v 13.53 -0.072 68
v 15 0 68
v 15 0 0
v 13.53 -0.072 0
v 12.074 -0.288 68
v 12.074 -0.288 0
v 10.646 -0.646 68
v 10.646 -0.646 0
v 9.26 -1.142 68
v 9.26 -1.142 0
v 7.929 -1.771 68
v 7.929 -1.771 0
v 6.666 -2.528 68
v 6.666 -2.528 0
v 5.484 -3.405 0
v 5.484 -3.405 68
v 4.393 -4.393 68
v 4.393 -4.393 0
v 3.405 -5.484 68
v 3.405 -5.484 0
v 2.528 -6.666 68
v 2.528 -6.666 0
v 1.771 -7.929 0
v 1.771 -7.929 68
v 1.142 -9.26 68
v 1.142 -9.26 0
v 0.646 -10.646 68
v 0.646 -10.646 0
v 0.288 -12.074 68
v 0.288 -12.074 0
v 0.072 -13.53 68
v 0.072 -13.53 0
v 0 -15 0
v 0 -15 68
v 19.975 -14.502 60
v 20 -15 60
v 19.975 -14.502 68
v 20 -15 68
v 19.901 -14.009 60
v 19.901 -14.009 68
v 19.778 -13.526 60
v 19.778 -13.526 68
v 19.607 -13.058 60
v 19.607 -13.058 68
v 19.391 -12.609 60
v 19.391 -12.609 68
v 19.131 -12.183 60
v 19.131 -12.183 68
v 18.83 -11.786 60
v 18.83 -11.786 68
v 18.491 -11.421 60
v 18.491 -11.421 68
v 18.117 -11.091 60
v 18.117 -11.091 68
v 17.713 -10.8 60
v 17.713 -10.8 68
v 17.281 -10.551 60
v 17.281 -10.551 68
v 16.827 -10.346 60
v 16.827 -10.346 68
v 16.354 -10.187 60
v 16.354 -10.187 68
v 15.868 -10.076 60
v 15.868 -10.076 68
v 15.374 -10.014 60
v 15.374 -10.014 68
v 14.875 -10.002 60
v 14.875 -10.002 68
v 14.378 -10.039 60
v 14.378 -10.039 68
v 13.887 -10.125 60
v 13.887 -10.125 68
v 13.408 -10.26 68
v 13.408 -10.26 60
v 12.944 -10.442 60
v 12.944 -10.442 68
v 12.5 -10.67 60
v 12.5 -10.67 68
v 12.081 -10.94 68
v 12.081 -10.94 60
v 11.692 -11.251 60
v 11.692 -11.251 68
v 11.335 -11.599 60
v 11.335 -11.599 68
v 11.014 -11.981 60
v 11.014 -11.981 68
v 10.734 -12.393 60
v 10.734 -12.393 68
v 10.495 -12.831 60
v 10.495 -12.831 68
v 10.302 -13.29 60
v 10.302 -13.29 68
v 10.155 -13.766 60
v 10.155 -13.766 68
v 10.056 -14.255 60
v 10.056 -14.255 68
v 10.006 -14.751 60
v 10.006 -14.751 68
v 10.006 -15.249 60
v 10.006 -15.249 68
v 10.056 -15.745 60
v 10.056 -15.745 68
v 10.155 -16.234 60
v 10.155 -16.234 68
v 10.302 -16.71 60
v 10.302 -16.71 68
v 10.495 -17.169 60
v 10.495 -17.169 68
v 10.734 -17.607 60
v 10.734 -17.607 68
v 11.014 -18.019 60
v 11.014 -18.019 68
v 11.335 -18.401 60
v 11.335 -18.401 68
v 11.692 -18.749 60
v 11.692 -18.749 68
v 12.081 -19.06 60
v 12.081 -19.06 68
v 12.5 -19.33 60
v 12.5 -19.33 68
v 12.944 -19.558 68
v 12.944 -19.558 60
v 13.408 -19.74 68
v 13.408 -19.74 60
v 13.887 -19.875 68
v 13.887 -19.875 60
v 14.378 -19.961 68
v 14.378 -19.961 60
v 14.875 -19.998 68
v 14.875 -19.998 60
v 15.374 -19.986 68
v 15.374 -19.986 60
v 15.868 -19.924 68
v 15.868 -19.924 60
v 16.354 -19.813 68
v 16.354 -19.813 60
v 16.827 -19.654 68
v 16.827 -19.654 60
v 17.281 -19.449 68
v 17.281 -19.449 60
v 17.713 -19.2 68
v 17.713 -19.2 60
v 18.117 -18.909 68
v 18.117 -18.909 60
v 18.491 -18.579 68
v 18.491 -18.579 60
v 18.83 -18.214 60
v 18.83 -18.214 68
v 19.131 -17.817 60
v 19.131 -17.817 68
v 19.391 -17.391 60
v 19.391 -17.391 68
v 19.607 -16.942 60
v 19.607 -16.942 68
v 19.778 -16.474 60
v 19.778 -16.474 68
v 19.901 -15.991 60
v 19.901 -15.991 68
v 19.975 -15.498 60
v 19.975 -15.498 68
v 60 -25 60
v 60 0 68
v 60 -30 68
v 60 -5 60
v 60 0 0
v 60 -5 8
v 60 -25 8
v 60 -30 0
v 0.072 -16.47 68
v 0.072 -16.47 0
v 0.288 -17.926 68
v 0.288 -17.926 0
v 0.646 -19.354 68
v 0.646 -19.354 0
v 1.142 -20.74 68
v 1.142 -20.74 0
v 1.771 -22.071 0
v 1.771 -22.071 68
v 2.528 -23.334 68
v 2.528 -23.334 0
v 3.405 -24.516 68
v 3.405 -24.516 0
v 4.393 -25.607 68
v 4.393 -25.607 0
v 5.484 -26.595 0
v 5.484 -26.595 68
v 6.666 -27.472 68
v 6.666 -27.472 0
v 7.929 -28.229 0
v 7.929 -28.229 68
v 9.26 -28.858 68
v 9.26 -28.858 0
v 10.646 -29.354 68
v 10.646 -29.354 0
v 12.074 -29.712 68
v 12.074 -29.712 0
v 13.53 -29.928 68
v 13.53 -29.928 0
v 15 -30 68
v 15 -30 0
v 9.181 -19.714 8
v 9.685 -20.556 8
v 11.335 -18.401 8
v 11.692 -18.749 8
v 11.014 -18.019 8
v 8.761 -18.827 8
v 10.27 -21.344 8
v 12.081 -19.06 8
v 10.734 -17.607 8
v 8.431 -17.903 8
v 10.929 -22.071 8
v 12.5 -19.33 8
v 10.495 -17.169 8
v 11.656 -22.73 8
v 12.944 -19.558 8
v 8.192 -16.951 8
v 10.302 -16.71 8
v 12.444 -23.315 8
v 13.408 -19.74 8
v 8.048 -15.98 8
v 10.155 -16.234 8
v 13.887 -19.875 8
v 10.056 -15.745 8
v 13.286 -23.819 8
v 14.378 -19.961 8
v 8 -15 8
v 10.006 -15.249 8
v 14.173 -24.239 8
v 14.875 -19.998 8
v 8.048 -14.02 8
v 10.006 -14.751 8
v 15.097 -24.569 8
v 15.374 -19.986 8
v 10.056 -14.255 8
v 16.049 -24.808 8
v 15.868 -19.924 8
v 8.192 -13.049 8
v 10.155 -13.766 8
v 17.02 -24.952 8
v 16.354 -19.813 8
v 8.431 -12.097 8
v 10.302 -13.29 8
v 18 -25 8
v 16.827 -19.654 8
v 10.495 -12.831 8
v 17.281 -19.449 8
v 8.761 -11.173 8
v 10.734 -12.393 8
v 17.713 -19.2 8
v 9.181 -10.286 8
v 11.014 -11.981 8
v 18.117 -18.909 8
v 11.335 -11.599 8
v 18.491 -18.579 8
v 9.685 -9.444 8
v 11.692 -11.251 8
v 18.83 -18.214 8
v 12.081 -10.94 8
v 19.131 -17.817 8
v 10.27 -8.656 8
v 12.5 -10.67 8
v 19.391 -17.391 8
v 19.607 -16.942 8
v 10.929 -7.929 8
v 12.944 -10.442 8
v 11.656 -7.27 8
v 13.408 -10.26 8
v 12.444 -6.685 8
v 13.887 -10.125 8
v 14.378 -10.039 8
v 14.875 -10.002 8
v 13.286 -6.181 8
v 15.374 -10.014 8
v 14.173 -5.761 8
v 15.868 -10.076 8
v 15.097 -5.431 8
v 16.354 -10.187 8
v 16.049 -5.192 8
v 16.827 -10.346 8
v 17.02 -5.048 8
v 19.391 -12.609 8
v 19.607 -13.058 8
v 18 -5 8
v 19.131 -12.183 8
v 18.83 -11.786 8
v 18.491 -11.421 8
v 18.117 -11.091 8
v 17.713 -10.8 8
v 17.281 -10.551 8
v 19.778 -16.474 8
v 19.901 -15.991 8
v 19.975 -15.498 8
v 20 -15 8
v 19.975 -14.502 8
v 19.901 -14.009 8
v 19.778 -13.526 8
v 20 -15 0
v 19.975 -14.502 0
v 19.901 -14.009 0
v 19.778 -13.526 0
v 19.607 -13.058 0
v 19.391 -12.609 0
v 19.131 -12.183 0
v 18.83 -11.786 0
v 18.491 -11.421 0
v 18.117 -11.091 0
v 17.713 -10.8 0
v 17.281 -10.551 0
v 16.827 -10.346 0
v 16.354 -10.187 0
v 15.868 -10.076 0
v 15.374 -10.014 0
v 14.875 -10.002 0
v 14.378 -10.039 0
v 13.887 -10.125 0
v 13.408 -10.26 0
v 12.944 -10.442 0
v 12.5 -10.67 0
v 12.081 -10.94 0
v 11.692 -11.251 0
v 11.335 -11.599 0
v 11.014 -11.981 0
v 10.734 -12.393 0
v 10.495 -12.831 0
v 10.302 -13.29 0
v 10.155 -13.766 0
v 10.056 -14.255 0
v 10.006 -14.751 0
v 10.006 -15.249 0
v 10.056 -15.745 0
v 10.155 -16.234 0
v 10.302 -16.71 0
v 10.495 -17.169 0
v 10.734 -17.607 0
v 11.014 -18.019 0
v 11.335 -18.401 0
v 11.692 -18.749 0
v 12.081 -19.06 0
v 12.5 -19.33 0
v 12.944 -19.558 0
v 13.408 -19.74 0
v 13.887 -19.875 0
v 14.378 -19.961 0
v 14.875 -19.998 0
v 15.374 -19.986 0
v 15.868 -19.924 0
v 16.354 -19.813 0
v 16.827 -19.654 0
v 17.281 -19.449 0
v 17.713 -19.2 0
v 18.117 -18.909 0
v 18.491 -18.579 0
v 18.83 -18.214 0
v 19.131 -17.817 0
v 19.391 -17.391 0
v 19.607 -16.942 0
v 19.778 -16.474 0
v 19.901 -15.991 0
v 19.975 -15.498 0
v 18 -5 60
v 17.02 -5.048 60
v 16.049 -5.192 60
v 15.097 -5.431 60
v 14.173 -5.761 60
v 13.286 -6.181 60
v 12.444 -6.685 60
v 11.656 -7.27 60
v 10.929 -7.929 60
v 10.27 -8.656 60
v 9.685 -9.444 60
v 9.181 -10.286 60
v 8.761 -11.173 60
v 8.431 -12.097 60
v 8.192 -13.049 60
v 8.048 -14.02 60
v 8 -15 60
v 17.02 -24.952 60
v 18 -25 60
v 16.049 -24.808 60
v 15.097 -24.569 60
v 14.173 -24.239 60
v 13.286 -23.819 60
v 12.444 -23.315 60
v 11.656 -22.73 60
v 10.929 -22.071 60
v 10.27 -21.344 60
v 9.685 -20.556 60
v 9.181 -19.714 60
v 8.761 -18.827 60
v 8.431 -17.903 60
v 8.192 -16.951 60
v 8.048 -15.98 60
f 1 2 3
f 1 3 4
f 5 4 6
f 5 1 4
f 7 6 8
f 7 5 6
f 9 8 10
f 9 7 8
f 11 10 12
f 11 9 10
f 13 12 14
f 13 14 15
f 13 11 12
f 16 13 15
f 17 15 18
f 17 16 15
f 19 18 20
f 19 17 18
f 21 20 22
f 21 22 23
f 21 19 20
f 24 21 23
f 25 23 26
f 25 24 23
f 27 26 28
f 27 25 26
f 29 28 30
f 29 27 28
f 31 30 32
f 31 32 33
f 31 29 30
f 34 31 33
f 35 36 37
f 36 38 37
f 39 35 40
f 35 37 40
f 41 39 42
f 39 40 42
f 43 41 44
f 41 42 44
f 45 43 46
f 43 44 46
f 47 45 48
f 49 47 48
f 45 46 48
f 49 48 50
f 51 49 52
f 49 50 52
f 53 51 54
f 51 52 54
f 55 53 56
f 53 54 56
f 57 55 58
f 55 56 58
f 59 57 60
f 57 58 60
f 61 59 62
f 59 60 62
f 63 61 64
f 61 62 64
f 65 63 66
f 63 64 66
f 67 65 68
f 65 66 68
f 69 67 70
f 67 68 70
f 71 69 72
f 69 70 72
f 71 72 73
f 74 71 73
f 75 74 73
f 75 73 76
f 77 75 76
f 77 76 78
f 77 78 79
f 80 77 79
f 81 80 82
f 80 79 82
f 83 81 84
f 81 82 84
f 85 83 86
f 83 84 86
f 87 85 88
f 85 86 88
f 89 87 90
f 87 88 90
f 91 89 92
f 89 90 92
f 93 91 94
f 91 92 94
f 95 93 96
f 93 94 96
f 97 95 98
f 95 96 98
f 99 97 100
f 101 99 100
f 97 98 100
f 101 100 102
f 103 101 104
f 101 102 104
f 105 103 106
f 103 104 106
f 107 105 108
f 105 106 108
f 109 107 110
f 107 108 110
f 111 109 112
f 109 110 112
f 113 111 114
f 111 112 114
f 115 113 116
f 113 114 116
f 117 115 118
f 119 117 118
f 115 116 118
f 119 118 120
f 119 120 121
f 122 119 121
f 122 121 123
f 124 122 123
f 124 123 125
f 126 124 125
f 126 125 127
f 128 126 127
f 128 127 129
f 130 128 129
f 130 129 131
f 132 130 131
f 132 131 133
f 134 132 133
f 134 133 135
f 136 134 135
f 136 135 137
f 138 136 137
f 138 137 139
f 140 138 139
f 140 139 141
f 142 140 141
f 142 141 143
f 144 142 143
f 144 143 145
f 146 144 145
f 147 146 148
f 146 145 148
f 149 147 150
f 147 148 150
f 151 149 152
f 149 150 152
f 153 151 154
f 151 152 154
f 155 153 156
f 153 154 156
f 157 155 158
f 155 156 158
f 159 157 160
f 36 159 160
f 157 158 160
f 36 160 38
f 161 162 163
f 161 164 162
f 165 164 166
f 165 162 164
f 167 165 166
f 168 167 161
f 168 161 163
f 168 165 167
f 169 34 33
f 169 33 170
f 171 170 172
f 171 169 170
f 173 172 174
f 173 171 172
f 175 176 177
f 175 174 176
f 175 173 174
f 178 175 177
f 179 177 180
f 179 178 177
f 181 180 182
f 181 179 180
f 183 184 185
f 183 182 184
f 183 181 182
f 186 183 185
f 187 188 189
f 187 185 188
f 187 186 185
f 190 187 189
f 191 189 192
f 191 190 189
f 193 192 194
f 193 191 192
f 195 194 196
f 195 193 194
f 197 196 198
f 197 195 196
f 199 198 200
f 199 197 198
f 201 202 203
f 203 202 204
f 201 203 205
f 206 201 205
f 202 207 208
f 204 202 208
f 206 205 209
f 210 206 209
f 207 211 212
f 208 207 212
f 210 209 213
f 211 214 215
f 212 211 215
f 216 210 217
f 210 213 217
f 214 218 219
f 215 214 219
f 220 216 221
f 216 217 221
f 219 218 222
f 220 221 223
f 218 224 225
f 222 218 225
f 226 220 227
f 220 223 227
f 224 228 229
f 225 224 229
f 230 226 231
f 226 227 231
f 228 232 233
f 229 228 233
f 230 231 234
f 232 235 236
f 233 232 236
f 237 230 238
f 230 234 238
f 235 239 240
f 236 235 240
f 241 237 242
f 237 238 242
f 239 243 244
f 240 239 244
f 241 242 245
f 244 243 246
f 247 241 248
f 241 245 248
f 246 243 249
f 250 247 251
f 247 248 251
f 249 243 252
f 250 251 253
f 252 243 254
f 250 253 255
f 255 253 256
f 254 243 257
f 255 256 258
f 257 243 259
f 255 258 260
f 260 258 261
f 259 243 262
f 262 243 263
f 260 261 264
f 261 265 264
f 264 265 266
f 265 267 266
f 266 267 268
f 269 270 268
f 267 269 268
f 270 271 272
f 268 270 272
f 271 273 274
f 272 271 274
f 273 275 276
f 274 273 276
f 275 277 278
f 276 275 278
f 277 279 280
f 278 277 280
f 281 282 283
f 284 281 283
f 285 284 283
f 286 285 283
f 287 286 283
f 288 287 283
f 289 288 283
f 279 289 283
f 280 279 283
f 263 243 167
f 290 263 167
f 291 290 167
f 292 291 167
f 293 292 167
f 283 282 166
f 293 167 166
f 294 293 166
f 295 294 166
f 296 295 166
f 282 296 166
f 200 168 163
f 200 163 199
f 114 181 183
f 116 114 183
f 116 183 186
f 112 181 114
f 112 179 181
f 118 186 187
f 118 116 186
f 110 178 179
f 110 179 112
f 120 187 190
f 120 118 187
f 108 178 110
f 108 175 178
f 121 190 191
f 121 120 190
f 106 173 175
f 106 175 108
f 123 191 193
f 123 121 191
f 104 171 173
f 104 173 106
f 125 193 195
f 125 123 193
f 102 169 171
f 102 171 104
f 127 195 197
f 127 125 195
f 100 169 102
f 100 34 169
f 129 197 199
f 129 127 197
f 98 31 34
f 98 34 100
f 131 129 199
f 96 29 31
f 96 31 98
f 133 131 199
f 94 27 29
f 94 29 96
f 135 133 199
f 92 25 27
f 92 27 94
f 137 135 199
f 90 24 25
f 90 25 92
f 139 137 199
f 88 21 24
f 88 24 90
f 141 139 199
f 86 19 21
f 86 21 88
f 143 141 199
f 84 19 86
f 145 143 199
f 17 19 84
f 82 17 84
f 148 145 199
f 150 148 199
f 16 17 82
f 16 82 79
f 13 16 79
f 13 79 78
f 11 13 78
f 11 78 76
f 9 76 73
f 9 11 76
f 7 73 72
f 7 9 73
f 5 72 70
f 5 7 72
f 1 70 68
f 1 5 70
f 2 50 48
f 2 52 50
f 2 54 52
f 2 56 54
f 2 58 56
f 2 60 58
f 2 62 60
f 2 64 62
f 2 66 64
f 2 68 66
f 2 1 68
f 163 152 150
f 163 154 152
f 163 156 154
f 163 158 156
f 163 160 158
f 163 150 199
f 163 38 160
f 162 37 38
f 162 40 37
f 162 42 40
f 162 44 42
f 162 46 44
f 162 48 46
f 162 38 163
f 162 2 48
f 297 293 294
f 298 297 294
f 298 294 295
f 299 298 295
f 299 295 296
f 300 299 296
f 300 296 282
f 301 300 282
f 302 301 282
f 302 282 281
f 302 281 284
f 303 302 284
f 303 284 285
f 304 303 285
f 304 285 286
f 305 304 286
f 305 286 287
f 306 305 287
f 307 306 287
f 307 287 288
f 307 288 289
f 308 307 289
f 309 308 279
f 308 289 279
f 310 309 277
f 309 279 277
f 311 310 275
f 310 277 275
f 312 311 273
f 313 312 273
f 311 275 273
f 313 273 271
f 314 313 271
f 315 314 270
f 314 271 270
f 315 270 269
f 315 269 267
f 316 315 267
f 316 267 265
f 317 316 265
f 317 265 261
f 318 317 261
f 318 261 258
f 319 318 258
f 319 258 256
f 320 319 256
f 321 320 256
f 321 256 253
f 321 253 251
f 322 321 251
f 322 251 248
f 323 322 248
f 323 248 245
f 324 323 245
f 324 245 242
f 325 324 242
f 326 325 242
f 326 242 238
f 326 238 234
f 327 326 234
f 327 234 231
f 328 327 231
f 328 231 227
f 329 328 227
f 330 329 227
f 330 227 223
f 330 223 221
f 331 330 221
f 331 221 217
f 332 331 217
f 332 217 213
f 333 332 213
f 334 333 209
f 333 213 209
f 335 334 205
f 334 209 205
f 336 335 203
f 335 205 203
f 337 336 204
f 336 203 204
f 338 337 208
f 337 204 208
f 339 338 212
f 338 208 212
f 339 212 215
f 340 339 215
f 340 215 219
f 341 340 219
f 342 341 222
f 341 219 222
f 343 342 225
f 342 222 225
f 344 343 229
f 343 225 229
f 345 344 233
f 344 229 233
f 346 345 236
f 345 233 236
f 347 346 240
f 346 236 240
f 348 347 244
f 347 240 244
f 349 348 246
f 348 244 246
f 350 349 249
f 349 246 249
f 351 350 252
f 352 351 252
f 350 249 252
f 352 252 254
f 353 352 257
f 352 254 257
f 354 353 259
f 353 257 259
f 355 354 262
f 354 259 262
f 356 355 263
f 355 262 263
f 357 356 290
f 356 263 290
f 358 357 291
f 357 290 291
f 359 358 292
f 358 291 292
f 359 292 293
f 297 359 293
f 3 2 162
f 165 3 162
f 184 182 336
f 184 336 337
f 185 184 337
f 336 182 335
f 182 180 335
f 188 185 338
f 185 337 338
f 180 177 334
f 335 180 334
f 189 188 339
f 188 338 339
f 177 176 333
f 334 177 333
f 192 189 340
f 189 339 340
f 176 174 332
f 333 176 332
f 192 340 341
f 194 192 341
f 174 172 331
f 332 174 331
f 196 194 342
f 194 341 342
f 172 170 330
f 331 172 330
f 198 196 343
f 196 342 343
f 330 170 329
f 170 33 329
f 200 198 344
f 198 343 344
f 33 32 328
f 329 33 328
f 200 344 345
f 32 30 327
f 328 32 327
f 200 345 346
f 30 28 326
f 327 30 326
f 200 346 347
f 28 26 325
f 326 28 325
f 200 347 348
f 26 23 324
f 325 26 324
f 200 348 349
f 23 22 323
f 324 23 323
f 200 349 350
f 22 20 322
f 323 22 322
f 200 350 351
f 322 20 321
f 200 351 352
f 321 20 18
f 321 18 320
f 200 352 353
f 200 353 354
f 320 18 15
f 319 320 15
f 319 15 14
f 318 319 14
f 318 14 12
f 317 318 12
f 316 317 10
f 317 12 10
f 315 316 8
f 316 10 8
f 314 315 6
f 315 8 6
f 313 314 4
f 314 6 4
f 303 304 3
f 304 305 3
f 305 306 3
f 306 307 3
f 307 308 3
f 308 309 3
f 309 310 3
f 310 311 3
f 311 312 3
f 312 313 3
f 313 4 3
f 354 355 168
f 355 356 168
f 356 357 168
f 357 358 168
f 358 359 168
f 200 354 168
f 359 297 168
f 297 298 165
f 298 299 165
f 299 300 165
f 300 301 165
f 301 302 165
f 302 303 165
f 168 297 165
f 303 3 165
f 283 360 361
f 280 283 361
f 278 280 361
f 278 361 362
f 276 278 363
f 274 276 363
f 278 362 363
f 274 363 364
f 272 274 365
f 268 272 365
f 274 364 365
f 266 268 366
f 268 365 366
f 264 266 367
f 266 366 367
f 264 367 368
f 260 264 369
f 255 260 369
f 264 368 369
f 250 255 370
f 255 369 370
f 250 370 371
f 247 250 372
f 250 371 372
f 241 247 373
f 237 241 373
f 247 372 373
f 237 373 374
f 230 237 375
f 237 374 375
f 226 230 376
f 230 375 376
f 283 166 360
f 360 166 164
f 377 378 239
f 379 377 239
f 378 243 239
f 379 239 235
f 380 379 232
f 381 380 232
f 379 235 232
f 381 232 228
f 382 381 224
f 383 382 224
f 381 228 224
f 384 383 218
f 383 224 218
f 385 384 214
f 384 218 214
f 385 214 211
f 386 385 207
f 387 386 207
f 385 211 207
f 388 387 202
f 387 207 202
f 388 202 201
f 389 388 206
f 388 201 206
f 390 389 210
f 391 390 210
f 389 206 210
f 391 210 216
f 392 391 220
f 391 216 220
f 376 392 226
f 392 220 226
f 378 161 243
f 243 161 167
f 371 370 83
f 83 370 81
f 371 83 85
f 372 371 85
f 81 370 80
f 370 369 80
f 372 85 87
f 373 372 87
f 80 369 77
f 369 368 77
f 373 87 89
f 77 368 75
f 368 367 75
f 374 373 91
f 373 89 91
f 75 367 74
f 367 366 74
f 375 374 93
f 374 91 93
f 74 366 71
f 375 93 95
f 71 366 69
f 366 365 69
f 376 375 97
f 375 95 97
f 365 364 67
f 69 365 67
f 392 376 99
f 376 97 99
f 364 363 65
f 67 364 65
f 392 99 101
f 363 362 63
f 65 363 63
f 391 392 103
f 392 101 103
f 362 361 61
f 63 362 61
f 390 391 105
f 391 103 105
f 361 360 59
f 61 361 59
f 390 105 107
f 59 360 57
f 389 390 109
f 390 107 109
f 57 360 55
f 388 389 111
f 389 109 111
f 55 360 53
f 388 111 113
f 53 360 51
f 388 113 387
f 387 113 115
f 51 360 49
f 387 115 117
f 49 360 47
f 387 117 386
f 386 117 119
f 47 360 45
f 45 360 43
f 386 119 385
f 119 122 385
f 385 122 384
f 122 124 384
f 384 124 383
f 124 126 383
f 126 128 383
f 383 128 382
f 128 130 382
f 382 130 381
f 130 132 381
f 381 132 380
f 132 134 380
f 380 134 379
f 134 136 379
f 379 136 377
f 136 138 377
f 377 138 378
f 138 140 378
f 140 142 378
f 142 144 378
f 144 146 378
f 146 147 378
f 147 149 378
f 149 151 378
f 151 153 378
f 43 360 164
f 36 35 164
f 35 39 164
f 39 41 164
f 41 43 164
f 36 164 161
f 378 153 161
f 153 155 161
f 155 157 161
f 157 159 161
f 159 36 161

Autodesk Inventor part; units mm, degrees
ref_plane "YZ Plane" through (0, 0, 0) normal (1, 0, 0) x (0, 1, 0)
ref_plane "XZ Plane" through (0, 0, 0) normal (0, 1, 0) x (-1, 0, 0)
ref_plane "XY Plane" through (0, 0, 0) normal (0, 0, 1) x (1, 0, 0)
sketch "Sketch1" plane through (0, 0, 0) normal (0, 0, 1) x (1, 0, 0)
  line L0 (0, 0) -> (60, 0)
  line L1 (60, 0) -> (60, -30)
  line L2 (60, -30) -> (0, -30)
  line L3 (0, -30) -> (0, 0)
  dimension "d0" = 60
  dimension "d1" = 30
extrude "Extrusion1" add sketch "Sketch1" along normal blind 68
sketch "Sketch2" plane through (0, 0, 68) normal (0, 0, 1) x (1, 0, 0)
  circle A0 centre (15, -15) radius 5
  line L0 (0, -30) -> (60, -30) projected
  line L1 (0, 0) -> (0, -30) projected
  dimension "d4" = 10
  dimension "d5" = 15
  dimension "d6" = 15
extrude "Extrusion2" cut sketch "Sketch2" against normal blind 68
sketch "Sketch3" plane through (60, -30, 0) normal (1, 0, 0) x (0, 0, -1)
  line L0 (-60, 5) -> (-8, 5)
  line L1 (-8, 5) -> (-8, 25)
  line L2 (-8, 25) -> (-60, 25)
  line L3 (-60, 25) -> (-60, 5)
  line L4 (-60, 5) -> (-8, 25) construction
  line L5 (-8, 5) -> (-60, 25) construction
  line L6 (-68, 0) -> (-68, 30) projected
  line L7 (0, 0) -> (-68, 0) projected
  point P0 (0, 30)
  point P1 (-34, 15)
  dimension "d9" = 52
  dimension "d10" = 20
  dimension "d11" = 34
  dimension "d12" = 15
extrude "Extrusion3" cut sketch "Sketch3" against normal blind 52
full round fillet "Full Round Fillet1" first side at (42.6667, -5, 25.3333) centre faces at (8, -11.6667, 42.6667) second side at (42.6667, -25, 42.6667)
fillet "Fillet1" radius 15 2 edges at (0, 0, 34) (0, -30, 34)
properties part number "1st arm"
